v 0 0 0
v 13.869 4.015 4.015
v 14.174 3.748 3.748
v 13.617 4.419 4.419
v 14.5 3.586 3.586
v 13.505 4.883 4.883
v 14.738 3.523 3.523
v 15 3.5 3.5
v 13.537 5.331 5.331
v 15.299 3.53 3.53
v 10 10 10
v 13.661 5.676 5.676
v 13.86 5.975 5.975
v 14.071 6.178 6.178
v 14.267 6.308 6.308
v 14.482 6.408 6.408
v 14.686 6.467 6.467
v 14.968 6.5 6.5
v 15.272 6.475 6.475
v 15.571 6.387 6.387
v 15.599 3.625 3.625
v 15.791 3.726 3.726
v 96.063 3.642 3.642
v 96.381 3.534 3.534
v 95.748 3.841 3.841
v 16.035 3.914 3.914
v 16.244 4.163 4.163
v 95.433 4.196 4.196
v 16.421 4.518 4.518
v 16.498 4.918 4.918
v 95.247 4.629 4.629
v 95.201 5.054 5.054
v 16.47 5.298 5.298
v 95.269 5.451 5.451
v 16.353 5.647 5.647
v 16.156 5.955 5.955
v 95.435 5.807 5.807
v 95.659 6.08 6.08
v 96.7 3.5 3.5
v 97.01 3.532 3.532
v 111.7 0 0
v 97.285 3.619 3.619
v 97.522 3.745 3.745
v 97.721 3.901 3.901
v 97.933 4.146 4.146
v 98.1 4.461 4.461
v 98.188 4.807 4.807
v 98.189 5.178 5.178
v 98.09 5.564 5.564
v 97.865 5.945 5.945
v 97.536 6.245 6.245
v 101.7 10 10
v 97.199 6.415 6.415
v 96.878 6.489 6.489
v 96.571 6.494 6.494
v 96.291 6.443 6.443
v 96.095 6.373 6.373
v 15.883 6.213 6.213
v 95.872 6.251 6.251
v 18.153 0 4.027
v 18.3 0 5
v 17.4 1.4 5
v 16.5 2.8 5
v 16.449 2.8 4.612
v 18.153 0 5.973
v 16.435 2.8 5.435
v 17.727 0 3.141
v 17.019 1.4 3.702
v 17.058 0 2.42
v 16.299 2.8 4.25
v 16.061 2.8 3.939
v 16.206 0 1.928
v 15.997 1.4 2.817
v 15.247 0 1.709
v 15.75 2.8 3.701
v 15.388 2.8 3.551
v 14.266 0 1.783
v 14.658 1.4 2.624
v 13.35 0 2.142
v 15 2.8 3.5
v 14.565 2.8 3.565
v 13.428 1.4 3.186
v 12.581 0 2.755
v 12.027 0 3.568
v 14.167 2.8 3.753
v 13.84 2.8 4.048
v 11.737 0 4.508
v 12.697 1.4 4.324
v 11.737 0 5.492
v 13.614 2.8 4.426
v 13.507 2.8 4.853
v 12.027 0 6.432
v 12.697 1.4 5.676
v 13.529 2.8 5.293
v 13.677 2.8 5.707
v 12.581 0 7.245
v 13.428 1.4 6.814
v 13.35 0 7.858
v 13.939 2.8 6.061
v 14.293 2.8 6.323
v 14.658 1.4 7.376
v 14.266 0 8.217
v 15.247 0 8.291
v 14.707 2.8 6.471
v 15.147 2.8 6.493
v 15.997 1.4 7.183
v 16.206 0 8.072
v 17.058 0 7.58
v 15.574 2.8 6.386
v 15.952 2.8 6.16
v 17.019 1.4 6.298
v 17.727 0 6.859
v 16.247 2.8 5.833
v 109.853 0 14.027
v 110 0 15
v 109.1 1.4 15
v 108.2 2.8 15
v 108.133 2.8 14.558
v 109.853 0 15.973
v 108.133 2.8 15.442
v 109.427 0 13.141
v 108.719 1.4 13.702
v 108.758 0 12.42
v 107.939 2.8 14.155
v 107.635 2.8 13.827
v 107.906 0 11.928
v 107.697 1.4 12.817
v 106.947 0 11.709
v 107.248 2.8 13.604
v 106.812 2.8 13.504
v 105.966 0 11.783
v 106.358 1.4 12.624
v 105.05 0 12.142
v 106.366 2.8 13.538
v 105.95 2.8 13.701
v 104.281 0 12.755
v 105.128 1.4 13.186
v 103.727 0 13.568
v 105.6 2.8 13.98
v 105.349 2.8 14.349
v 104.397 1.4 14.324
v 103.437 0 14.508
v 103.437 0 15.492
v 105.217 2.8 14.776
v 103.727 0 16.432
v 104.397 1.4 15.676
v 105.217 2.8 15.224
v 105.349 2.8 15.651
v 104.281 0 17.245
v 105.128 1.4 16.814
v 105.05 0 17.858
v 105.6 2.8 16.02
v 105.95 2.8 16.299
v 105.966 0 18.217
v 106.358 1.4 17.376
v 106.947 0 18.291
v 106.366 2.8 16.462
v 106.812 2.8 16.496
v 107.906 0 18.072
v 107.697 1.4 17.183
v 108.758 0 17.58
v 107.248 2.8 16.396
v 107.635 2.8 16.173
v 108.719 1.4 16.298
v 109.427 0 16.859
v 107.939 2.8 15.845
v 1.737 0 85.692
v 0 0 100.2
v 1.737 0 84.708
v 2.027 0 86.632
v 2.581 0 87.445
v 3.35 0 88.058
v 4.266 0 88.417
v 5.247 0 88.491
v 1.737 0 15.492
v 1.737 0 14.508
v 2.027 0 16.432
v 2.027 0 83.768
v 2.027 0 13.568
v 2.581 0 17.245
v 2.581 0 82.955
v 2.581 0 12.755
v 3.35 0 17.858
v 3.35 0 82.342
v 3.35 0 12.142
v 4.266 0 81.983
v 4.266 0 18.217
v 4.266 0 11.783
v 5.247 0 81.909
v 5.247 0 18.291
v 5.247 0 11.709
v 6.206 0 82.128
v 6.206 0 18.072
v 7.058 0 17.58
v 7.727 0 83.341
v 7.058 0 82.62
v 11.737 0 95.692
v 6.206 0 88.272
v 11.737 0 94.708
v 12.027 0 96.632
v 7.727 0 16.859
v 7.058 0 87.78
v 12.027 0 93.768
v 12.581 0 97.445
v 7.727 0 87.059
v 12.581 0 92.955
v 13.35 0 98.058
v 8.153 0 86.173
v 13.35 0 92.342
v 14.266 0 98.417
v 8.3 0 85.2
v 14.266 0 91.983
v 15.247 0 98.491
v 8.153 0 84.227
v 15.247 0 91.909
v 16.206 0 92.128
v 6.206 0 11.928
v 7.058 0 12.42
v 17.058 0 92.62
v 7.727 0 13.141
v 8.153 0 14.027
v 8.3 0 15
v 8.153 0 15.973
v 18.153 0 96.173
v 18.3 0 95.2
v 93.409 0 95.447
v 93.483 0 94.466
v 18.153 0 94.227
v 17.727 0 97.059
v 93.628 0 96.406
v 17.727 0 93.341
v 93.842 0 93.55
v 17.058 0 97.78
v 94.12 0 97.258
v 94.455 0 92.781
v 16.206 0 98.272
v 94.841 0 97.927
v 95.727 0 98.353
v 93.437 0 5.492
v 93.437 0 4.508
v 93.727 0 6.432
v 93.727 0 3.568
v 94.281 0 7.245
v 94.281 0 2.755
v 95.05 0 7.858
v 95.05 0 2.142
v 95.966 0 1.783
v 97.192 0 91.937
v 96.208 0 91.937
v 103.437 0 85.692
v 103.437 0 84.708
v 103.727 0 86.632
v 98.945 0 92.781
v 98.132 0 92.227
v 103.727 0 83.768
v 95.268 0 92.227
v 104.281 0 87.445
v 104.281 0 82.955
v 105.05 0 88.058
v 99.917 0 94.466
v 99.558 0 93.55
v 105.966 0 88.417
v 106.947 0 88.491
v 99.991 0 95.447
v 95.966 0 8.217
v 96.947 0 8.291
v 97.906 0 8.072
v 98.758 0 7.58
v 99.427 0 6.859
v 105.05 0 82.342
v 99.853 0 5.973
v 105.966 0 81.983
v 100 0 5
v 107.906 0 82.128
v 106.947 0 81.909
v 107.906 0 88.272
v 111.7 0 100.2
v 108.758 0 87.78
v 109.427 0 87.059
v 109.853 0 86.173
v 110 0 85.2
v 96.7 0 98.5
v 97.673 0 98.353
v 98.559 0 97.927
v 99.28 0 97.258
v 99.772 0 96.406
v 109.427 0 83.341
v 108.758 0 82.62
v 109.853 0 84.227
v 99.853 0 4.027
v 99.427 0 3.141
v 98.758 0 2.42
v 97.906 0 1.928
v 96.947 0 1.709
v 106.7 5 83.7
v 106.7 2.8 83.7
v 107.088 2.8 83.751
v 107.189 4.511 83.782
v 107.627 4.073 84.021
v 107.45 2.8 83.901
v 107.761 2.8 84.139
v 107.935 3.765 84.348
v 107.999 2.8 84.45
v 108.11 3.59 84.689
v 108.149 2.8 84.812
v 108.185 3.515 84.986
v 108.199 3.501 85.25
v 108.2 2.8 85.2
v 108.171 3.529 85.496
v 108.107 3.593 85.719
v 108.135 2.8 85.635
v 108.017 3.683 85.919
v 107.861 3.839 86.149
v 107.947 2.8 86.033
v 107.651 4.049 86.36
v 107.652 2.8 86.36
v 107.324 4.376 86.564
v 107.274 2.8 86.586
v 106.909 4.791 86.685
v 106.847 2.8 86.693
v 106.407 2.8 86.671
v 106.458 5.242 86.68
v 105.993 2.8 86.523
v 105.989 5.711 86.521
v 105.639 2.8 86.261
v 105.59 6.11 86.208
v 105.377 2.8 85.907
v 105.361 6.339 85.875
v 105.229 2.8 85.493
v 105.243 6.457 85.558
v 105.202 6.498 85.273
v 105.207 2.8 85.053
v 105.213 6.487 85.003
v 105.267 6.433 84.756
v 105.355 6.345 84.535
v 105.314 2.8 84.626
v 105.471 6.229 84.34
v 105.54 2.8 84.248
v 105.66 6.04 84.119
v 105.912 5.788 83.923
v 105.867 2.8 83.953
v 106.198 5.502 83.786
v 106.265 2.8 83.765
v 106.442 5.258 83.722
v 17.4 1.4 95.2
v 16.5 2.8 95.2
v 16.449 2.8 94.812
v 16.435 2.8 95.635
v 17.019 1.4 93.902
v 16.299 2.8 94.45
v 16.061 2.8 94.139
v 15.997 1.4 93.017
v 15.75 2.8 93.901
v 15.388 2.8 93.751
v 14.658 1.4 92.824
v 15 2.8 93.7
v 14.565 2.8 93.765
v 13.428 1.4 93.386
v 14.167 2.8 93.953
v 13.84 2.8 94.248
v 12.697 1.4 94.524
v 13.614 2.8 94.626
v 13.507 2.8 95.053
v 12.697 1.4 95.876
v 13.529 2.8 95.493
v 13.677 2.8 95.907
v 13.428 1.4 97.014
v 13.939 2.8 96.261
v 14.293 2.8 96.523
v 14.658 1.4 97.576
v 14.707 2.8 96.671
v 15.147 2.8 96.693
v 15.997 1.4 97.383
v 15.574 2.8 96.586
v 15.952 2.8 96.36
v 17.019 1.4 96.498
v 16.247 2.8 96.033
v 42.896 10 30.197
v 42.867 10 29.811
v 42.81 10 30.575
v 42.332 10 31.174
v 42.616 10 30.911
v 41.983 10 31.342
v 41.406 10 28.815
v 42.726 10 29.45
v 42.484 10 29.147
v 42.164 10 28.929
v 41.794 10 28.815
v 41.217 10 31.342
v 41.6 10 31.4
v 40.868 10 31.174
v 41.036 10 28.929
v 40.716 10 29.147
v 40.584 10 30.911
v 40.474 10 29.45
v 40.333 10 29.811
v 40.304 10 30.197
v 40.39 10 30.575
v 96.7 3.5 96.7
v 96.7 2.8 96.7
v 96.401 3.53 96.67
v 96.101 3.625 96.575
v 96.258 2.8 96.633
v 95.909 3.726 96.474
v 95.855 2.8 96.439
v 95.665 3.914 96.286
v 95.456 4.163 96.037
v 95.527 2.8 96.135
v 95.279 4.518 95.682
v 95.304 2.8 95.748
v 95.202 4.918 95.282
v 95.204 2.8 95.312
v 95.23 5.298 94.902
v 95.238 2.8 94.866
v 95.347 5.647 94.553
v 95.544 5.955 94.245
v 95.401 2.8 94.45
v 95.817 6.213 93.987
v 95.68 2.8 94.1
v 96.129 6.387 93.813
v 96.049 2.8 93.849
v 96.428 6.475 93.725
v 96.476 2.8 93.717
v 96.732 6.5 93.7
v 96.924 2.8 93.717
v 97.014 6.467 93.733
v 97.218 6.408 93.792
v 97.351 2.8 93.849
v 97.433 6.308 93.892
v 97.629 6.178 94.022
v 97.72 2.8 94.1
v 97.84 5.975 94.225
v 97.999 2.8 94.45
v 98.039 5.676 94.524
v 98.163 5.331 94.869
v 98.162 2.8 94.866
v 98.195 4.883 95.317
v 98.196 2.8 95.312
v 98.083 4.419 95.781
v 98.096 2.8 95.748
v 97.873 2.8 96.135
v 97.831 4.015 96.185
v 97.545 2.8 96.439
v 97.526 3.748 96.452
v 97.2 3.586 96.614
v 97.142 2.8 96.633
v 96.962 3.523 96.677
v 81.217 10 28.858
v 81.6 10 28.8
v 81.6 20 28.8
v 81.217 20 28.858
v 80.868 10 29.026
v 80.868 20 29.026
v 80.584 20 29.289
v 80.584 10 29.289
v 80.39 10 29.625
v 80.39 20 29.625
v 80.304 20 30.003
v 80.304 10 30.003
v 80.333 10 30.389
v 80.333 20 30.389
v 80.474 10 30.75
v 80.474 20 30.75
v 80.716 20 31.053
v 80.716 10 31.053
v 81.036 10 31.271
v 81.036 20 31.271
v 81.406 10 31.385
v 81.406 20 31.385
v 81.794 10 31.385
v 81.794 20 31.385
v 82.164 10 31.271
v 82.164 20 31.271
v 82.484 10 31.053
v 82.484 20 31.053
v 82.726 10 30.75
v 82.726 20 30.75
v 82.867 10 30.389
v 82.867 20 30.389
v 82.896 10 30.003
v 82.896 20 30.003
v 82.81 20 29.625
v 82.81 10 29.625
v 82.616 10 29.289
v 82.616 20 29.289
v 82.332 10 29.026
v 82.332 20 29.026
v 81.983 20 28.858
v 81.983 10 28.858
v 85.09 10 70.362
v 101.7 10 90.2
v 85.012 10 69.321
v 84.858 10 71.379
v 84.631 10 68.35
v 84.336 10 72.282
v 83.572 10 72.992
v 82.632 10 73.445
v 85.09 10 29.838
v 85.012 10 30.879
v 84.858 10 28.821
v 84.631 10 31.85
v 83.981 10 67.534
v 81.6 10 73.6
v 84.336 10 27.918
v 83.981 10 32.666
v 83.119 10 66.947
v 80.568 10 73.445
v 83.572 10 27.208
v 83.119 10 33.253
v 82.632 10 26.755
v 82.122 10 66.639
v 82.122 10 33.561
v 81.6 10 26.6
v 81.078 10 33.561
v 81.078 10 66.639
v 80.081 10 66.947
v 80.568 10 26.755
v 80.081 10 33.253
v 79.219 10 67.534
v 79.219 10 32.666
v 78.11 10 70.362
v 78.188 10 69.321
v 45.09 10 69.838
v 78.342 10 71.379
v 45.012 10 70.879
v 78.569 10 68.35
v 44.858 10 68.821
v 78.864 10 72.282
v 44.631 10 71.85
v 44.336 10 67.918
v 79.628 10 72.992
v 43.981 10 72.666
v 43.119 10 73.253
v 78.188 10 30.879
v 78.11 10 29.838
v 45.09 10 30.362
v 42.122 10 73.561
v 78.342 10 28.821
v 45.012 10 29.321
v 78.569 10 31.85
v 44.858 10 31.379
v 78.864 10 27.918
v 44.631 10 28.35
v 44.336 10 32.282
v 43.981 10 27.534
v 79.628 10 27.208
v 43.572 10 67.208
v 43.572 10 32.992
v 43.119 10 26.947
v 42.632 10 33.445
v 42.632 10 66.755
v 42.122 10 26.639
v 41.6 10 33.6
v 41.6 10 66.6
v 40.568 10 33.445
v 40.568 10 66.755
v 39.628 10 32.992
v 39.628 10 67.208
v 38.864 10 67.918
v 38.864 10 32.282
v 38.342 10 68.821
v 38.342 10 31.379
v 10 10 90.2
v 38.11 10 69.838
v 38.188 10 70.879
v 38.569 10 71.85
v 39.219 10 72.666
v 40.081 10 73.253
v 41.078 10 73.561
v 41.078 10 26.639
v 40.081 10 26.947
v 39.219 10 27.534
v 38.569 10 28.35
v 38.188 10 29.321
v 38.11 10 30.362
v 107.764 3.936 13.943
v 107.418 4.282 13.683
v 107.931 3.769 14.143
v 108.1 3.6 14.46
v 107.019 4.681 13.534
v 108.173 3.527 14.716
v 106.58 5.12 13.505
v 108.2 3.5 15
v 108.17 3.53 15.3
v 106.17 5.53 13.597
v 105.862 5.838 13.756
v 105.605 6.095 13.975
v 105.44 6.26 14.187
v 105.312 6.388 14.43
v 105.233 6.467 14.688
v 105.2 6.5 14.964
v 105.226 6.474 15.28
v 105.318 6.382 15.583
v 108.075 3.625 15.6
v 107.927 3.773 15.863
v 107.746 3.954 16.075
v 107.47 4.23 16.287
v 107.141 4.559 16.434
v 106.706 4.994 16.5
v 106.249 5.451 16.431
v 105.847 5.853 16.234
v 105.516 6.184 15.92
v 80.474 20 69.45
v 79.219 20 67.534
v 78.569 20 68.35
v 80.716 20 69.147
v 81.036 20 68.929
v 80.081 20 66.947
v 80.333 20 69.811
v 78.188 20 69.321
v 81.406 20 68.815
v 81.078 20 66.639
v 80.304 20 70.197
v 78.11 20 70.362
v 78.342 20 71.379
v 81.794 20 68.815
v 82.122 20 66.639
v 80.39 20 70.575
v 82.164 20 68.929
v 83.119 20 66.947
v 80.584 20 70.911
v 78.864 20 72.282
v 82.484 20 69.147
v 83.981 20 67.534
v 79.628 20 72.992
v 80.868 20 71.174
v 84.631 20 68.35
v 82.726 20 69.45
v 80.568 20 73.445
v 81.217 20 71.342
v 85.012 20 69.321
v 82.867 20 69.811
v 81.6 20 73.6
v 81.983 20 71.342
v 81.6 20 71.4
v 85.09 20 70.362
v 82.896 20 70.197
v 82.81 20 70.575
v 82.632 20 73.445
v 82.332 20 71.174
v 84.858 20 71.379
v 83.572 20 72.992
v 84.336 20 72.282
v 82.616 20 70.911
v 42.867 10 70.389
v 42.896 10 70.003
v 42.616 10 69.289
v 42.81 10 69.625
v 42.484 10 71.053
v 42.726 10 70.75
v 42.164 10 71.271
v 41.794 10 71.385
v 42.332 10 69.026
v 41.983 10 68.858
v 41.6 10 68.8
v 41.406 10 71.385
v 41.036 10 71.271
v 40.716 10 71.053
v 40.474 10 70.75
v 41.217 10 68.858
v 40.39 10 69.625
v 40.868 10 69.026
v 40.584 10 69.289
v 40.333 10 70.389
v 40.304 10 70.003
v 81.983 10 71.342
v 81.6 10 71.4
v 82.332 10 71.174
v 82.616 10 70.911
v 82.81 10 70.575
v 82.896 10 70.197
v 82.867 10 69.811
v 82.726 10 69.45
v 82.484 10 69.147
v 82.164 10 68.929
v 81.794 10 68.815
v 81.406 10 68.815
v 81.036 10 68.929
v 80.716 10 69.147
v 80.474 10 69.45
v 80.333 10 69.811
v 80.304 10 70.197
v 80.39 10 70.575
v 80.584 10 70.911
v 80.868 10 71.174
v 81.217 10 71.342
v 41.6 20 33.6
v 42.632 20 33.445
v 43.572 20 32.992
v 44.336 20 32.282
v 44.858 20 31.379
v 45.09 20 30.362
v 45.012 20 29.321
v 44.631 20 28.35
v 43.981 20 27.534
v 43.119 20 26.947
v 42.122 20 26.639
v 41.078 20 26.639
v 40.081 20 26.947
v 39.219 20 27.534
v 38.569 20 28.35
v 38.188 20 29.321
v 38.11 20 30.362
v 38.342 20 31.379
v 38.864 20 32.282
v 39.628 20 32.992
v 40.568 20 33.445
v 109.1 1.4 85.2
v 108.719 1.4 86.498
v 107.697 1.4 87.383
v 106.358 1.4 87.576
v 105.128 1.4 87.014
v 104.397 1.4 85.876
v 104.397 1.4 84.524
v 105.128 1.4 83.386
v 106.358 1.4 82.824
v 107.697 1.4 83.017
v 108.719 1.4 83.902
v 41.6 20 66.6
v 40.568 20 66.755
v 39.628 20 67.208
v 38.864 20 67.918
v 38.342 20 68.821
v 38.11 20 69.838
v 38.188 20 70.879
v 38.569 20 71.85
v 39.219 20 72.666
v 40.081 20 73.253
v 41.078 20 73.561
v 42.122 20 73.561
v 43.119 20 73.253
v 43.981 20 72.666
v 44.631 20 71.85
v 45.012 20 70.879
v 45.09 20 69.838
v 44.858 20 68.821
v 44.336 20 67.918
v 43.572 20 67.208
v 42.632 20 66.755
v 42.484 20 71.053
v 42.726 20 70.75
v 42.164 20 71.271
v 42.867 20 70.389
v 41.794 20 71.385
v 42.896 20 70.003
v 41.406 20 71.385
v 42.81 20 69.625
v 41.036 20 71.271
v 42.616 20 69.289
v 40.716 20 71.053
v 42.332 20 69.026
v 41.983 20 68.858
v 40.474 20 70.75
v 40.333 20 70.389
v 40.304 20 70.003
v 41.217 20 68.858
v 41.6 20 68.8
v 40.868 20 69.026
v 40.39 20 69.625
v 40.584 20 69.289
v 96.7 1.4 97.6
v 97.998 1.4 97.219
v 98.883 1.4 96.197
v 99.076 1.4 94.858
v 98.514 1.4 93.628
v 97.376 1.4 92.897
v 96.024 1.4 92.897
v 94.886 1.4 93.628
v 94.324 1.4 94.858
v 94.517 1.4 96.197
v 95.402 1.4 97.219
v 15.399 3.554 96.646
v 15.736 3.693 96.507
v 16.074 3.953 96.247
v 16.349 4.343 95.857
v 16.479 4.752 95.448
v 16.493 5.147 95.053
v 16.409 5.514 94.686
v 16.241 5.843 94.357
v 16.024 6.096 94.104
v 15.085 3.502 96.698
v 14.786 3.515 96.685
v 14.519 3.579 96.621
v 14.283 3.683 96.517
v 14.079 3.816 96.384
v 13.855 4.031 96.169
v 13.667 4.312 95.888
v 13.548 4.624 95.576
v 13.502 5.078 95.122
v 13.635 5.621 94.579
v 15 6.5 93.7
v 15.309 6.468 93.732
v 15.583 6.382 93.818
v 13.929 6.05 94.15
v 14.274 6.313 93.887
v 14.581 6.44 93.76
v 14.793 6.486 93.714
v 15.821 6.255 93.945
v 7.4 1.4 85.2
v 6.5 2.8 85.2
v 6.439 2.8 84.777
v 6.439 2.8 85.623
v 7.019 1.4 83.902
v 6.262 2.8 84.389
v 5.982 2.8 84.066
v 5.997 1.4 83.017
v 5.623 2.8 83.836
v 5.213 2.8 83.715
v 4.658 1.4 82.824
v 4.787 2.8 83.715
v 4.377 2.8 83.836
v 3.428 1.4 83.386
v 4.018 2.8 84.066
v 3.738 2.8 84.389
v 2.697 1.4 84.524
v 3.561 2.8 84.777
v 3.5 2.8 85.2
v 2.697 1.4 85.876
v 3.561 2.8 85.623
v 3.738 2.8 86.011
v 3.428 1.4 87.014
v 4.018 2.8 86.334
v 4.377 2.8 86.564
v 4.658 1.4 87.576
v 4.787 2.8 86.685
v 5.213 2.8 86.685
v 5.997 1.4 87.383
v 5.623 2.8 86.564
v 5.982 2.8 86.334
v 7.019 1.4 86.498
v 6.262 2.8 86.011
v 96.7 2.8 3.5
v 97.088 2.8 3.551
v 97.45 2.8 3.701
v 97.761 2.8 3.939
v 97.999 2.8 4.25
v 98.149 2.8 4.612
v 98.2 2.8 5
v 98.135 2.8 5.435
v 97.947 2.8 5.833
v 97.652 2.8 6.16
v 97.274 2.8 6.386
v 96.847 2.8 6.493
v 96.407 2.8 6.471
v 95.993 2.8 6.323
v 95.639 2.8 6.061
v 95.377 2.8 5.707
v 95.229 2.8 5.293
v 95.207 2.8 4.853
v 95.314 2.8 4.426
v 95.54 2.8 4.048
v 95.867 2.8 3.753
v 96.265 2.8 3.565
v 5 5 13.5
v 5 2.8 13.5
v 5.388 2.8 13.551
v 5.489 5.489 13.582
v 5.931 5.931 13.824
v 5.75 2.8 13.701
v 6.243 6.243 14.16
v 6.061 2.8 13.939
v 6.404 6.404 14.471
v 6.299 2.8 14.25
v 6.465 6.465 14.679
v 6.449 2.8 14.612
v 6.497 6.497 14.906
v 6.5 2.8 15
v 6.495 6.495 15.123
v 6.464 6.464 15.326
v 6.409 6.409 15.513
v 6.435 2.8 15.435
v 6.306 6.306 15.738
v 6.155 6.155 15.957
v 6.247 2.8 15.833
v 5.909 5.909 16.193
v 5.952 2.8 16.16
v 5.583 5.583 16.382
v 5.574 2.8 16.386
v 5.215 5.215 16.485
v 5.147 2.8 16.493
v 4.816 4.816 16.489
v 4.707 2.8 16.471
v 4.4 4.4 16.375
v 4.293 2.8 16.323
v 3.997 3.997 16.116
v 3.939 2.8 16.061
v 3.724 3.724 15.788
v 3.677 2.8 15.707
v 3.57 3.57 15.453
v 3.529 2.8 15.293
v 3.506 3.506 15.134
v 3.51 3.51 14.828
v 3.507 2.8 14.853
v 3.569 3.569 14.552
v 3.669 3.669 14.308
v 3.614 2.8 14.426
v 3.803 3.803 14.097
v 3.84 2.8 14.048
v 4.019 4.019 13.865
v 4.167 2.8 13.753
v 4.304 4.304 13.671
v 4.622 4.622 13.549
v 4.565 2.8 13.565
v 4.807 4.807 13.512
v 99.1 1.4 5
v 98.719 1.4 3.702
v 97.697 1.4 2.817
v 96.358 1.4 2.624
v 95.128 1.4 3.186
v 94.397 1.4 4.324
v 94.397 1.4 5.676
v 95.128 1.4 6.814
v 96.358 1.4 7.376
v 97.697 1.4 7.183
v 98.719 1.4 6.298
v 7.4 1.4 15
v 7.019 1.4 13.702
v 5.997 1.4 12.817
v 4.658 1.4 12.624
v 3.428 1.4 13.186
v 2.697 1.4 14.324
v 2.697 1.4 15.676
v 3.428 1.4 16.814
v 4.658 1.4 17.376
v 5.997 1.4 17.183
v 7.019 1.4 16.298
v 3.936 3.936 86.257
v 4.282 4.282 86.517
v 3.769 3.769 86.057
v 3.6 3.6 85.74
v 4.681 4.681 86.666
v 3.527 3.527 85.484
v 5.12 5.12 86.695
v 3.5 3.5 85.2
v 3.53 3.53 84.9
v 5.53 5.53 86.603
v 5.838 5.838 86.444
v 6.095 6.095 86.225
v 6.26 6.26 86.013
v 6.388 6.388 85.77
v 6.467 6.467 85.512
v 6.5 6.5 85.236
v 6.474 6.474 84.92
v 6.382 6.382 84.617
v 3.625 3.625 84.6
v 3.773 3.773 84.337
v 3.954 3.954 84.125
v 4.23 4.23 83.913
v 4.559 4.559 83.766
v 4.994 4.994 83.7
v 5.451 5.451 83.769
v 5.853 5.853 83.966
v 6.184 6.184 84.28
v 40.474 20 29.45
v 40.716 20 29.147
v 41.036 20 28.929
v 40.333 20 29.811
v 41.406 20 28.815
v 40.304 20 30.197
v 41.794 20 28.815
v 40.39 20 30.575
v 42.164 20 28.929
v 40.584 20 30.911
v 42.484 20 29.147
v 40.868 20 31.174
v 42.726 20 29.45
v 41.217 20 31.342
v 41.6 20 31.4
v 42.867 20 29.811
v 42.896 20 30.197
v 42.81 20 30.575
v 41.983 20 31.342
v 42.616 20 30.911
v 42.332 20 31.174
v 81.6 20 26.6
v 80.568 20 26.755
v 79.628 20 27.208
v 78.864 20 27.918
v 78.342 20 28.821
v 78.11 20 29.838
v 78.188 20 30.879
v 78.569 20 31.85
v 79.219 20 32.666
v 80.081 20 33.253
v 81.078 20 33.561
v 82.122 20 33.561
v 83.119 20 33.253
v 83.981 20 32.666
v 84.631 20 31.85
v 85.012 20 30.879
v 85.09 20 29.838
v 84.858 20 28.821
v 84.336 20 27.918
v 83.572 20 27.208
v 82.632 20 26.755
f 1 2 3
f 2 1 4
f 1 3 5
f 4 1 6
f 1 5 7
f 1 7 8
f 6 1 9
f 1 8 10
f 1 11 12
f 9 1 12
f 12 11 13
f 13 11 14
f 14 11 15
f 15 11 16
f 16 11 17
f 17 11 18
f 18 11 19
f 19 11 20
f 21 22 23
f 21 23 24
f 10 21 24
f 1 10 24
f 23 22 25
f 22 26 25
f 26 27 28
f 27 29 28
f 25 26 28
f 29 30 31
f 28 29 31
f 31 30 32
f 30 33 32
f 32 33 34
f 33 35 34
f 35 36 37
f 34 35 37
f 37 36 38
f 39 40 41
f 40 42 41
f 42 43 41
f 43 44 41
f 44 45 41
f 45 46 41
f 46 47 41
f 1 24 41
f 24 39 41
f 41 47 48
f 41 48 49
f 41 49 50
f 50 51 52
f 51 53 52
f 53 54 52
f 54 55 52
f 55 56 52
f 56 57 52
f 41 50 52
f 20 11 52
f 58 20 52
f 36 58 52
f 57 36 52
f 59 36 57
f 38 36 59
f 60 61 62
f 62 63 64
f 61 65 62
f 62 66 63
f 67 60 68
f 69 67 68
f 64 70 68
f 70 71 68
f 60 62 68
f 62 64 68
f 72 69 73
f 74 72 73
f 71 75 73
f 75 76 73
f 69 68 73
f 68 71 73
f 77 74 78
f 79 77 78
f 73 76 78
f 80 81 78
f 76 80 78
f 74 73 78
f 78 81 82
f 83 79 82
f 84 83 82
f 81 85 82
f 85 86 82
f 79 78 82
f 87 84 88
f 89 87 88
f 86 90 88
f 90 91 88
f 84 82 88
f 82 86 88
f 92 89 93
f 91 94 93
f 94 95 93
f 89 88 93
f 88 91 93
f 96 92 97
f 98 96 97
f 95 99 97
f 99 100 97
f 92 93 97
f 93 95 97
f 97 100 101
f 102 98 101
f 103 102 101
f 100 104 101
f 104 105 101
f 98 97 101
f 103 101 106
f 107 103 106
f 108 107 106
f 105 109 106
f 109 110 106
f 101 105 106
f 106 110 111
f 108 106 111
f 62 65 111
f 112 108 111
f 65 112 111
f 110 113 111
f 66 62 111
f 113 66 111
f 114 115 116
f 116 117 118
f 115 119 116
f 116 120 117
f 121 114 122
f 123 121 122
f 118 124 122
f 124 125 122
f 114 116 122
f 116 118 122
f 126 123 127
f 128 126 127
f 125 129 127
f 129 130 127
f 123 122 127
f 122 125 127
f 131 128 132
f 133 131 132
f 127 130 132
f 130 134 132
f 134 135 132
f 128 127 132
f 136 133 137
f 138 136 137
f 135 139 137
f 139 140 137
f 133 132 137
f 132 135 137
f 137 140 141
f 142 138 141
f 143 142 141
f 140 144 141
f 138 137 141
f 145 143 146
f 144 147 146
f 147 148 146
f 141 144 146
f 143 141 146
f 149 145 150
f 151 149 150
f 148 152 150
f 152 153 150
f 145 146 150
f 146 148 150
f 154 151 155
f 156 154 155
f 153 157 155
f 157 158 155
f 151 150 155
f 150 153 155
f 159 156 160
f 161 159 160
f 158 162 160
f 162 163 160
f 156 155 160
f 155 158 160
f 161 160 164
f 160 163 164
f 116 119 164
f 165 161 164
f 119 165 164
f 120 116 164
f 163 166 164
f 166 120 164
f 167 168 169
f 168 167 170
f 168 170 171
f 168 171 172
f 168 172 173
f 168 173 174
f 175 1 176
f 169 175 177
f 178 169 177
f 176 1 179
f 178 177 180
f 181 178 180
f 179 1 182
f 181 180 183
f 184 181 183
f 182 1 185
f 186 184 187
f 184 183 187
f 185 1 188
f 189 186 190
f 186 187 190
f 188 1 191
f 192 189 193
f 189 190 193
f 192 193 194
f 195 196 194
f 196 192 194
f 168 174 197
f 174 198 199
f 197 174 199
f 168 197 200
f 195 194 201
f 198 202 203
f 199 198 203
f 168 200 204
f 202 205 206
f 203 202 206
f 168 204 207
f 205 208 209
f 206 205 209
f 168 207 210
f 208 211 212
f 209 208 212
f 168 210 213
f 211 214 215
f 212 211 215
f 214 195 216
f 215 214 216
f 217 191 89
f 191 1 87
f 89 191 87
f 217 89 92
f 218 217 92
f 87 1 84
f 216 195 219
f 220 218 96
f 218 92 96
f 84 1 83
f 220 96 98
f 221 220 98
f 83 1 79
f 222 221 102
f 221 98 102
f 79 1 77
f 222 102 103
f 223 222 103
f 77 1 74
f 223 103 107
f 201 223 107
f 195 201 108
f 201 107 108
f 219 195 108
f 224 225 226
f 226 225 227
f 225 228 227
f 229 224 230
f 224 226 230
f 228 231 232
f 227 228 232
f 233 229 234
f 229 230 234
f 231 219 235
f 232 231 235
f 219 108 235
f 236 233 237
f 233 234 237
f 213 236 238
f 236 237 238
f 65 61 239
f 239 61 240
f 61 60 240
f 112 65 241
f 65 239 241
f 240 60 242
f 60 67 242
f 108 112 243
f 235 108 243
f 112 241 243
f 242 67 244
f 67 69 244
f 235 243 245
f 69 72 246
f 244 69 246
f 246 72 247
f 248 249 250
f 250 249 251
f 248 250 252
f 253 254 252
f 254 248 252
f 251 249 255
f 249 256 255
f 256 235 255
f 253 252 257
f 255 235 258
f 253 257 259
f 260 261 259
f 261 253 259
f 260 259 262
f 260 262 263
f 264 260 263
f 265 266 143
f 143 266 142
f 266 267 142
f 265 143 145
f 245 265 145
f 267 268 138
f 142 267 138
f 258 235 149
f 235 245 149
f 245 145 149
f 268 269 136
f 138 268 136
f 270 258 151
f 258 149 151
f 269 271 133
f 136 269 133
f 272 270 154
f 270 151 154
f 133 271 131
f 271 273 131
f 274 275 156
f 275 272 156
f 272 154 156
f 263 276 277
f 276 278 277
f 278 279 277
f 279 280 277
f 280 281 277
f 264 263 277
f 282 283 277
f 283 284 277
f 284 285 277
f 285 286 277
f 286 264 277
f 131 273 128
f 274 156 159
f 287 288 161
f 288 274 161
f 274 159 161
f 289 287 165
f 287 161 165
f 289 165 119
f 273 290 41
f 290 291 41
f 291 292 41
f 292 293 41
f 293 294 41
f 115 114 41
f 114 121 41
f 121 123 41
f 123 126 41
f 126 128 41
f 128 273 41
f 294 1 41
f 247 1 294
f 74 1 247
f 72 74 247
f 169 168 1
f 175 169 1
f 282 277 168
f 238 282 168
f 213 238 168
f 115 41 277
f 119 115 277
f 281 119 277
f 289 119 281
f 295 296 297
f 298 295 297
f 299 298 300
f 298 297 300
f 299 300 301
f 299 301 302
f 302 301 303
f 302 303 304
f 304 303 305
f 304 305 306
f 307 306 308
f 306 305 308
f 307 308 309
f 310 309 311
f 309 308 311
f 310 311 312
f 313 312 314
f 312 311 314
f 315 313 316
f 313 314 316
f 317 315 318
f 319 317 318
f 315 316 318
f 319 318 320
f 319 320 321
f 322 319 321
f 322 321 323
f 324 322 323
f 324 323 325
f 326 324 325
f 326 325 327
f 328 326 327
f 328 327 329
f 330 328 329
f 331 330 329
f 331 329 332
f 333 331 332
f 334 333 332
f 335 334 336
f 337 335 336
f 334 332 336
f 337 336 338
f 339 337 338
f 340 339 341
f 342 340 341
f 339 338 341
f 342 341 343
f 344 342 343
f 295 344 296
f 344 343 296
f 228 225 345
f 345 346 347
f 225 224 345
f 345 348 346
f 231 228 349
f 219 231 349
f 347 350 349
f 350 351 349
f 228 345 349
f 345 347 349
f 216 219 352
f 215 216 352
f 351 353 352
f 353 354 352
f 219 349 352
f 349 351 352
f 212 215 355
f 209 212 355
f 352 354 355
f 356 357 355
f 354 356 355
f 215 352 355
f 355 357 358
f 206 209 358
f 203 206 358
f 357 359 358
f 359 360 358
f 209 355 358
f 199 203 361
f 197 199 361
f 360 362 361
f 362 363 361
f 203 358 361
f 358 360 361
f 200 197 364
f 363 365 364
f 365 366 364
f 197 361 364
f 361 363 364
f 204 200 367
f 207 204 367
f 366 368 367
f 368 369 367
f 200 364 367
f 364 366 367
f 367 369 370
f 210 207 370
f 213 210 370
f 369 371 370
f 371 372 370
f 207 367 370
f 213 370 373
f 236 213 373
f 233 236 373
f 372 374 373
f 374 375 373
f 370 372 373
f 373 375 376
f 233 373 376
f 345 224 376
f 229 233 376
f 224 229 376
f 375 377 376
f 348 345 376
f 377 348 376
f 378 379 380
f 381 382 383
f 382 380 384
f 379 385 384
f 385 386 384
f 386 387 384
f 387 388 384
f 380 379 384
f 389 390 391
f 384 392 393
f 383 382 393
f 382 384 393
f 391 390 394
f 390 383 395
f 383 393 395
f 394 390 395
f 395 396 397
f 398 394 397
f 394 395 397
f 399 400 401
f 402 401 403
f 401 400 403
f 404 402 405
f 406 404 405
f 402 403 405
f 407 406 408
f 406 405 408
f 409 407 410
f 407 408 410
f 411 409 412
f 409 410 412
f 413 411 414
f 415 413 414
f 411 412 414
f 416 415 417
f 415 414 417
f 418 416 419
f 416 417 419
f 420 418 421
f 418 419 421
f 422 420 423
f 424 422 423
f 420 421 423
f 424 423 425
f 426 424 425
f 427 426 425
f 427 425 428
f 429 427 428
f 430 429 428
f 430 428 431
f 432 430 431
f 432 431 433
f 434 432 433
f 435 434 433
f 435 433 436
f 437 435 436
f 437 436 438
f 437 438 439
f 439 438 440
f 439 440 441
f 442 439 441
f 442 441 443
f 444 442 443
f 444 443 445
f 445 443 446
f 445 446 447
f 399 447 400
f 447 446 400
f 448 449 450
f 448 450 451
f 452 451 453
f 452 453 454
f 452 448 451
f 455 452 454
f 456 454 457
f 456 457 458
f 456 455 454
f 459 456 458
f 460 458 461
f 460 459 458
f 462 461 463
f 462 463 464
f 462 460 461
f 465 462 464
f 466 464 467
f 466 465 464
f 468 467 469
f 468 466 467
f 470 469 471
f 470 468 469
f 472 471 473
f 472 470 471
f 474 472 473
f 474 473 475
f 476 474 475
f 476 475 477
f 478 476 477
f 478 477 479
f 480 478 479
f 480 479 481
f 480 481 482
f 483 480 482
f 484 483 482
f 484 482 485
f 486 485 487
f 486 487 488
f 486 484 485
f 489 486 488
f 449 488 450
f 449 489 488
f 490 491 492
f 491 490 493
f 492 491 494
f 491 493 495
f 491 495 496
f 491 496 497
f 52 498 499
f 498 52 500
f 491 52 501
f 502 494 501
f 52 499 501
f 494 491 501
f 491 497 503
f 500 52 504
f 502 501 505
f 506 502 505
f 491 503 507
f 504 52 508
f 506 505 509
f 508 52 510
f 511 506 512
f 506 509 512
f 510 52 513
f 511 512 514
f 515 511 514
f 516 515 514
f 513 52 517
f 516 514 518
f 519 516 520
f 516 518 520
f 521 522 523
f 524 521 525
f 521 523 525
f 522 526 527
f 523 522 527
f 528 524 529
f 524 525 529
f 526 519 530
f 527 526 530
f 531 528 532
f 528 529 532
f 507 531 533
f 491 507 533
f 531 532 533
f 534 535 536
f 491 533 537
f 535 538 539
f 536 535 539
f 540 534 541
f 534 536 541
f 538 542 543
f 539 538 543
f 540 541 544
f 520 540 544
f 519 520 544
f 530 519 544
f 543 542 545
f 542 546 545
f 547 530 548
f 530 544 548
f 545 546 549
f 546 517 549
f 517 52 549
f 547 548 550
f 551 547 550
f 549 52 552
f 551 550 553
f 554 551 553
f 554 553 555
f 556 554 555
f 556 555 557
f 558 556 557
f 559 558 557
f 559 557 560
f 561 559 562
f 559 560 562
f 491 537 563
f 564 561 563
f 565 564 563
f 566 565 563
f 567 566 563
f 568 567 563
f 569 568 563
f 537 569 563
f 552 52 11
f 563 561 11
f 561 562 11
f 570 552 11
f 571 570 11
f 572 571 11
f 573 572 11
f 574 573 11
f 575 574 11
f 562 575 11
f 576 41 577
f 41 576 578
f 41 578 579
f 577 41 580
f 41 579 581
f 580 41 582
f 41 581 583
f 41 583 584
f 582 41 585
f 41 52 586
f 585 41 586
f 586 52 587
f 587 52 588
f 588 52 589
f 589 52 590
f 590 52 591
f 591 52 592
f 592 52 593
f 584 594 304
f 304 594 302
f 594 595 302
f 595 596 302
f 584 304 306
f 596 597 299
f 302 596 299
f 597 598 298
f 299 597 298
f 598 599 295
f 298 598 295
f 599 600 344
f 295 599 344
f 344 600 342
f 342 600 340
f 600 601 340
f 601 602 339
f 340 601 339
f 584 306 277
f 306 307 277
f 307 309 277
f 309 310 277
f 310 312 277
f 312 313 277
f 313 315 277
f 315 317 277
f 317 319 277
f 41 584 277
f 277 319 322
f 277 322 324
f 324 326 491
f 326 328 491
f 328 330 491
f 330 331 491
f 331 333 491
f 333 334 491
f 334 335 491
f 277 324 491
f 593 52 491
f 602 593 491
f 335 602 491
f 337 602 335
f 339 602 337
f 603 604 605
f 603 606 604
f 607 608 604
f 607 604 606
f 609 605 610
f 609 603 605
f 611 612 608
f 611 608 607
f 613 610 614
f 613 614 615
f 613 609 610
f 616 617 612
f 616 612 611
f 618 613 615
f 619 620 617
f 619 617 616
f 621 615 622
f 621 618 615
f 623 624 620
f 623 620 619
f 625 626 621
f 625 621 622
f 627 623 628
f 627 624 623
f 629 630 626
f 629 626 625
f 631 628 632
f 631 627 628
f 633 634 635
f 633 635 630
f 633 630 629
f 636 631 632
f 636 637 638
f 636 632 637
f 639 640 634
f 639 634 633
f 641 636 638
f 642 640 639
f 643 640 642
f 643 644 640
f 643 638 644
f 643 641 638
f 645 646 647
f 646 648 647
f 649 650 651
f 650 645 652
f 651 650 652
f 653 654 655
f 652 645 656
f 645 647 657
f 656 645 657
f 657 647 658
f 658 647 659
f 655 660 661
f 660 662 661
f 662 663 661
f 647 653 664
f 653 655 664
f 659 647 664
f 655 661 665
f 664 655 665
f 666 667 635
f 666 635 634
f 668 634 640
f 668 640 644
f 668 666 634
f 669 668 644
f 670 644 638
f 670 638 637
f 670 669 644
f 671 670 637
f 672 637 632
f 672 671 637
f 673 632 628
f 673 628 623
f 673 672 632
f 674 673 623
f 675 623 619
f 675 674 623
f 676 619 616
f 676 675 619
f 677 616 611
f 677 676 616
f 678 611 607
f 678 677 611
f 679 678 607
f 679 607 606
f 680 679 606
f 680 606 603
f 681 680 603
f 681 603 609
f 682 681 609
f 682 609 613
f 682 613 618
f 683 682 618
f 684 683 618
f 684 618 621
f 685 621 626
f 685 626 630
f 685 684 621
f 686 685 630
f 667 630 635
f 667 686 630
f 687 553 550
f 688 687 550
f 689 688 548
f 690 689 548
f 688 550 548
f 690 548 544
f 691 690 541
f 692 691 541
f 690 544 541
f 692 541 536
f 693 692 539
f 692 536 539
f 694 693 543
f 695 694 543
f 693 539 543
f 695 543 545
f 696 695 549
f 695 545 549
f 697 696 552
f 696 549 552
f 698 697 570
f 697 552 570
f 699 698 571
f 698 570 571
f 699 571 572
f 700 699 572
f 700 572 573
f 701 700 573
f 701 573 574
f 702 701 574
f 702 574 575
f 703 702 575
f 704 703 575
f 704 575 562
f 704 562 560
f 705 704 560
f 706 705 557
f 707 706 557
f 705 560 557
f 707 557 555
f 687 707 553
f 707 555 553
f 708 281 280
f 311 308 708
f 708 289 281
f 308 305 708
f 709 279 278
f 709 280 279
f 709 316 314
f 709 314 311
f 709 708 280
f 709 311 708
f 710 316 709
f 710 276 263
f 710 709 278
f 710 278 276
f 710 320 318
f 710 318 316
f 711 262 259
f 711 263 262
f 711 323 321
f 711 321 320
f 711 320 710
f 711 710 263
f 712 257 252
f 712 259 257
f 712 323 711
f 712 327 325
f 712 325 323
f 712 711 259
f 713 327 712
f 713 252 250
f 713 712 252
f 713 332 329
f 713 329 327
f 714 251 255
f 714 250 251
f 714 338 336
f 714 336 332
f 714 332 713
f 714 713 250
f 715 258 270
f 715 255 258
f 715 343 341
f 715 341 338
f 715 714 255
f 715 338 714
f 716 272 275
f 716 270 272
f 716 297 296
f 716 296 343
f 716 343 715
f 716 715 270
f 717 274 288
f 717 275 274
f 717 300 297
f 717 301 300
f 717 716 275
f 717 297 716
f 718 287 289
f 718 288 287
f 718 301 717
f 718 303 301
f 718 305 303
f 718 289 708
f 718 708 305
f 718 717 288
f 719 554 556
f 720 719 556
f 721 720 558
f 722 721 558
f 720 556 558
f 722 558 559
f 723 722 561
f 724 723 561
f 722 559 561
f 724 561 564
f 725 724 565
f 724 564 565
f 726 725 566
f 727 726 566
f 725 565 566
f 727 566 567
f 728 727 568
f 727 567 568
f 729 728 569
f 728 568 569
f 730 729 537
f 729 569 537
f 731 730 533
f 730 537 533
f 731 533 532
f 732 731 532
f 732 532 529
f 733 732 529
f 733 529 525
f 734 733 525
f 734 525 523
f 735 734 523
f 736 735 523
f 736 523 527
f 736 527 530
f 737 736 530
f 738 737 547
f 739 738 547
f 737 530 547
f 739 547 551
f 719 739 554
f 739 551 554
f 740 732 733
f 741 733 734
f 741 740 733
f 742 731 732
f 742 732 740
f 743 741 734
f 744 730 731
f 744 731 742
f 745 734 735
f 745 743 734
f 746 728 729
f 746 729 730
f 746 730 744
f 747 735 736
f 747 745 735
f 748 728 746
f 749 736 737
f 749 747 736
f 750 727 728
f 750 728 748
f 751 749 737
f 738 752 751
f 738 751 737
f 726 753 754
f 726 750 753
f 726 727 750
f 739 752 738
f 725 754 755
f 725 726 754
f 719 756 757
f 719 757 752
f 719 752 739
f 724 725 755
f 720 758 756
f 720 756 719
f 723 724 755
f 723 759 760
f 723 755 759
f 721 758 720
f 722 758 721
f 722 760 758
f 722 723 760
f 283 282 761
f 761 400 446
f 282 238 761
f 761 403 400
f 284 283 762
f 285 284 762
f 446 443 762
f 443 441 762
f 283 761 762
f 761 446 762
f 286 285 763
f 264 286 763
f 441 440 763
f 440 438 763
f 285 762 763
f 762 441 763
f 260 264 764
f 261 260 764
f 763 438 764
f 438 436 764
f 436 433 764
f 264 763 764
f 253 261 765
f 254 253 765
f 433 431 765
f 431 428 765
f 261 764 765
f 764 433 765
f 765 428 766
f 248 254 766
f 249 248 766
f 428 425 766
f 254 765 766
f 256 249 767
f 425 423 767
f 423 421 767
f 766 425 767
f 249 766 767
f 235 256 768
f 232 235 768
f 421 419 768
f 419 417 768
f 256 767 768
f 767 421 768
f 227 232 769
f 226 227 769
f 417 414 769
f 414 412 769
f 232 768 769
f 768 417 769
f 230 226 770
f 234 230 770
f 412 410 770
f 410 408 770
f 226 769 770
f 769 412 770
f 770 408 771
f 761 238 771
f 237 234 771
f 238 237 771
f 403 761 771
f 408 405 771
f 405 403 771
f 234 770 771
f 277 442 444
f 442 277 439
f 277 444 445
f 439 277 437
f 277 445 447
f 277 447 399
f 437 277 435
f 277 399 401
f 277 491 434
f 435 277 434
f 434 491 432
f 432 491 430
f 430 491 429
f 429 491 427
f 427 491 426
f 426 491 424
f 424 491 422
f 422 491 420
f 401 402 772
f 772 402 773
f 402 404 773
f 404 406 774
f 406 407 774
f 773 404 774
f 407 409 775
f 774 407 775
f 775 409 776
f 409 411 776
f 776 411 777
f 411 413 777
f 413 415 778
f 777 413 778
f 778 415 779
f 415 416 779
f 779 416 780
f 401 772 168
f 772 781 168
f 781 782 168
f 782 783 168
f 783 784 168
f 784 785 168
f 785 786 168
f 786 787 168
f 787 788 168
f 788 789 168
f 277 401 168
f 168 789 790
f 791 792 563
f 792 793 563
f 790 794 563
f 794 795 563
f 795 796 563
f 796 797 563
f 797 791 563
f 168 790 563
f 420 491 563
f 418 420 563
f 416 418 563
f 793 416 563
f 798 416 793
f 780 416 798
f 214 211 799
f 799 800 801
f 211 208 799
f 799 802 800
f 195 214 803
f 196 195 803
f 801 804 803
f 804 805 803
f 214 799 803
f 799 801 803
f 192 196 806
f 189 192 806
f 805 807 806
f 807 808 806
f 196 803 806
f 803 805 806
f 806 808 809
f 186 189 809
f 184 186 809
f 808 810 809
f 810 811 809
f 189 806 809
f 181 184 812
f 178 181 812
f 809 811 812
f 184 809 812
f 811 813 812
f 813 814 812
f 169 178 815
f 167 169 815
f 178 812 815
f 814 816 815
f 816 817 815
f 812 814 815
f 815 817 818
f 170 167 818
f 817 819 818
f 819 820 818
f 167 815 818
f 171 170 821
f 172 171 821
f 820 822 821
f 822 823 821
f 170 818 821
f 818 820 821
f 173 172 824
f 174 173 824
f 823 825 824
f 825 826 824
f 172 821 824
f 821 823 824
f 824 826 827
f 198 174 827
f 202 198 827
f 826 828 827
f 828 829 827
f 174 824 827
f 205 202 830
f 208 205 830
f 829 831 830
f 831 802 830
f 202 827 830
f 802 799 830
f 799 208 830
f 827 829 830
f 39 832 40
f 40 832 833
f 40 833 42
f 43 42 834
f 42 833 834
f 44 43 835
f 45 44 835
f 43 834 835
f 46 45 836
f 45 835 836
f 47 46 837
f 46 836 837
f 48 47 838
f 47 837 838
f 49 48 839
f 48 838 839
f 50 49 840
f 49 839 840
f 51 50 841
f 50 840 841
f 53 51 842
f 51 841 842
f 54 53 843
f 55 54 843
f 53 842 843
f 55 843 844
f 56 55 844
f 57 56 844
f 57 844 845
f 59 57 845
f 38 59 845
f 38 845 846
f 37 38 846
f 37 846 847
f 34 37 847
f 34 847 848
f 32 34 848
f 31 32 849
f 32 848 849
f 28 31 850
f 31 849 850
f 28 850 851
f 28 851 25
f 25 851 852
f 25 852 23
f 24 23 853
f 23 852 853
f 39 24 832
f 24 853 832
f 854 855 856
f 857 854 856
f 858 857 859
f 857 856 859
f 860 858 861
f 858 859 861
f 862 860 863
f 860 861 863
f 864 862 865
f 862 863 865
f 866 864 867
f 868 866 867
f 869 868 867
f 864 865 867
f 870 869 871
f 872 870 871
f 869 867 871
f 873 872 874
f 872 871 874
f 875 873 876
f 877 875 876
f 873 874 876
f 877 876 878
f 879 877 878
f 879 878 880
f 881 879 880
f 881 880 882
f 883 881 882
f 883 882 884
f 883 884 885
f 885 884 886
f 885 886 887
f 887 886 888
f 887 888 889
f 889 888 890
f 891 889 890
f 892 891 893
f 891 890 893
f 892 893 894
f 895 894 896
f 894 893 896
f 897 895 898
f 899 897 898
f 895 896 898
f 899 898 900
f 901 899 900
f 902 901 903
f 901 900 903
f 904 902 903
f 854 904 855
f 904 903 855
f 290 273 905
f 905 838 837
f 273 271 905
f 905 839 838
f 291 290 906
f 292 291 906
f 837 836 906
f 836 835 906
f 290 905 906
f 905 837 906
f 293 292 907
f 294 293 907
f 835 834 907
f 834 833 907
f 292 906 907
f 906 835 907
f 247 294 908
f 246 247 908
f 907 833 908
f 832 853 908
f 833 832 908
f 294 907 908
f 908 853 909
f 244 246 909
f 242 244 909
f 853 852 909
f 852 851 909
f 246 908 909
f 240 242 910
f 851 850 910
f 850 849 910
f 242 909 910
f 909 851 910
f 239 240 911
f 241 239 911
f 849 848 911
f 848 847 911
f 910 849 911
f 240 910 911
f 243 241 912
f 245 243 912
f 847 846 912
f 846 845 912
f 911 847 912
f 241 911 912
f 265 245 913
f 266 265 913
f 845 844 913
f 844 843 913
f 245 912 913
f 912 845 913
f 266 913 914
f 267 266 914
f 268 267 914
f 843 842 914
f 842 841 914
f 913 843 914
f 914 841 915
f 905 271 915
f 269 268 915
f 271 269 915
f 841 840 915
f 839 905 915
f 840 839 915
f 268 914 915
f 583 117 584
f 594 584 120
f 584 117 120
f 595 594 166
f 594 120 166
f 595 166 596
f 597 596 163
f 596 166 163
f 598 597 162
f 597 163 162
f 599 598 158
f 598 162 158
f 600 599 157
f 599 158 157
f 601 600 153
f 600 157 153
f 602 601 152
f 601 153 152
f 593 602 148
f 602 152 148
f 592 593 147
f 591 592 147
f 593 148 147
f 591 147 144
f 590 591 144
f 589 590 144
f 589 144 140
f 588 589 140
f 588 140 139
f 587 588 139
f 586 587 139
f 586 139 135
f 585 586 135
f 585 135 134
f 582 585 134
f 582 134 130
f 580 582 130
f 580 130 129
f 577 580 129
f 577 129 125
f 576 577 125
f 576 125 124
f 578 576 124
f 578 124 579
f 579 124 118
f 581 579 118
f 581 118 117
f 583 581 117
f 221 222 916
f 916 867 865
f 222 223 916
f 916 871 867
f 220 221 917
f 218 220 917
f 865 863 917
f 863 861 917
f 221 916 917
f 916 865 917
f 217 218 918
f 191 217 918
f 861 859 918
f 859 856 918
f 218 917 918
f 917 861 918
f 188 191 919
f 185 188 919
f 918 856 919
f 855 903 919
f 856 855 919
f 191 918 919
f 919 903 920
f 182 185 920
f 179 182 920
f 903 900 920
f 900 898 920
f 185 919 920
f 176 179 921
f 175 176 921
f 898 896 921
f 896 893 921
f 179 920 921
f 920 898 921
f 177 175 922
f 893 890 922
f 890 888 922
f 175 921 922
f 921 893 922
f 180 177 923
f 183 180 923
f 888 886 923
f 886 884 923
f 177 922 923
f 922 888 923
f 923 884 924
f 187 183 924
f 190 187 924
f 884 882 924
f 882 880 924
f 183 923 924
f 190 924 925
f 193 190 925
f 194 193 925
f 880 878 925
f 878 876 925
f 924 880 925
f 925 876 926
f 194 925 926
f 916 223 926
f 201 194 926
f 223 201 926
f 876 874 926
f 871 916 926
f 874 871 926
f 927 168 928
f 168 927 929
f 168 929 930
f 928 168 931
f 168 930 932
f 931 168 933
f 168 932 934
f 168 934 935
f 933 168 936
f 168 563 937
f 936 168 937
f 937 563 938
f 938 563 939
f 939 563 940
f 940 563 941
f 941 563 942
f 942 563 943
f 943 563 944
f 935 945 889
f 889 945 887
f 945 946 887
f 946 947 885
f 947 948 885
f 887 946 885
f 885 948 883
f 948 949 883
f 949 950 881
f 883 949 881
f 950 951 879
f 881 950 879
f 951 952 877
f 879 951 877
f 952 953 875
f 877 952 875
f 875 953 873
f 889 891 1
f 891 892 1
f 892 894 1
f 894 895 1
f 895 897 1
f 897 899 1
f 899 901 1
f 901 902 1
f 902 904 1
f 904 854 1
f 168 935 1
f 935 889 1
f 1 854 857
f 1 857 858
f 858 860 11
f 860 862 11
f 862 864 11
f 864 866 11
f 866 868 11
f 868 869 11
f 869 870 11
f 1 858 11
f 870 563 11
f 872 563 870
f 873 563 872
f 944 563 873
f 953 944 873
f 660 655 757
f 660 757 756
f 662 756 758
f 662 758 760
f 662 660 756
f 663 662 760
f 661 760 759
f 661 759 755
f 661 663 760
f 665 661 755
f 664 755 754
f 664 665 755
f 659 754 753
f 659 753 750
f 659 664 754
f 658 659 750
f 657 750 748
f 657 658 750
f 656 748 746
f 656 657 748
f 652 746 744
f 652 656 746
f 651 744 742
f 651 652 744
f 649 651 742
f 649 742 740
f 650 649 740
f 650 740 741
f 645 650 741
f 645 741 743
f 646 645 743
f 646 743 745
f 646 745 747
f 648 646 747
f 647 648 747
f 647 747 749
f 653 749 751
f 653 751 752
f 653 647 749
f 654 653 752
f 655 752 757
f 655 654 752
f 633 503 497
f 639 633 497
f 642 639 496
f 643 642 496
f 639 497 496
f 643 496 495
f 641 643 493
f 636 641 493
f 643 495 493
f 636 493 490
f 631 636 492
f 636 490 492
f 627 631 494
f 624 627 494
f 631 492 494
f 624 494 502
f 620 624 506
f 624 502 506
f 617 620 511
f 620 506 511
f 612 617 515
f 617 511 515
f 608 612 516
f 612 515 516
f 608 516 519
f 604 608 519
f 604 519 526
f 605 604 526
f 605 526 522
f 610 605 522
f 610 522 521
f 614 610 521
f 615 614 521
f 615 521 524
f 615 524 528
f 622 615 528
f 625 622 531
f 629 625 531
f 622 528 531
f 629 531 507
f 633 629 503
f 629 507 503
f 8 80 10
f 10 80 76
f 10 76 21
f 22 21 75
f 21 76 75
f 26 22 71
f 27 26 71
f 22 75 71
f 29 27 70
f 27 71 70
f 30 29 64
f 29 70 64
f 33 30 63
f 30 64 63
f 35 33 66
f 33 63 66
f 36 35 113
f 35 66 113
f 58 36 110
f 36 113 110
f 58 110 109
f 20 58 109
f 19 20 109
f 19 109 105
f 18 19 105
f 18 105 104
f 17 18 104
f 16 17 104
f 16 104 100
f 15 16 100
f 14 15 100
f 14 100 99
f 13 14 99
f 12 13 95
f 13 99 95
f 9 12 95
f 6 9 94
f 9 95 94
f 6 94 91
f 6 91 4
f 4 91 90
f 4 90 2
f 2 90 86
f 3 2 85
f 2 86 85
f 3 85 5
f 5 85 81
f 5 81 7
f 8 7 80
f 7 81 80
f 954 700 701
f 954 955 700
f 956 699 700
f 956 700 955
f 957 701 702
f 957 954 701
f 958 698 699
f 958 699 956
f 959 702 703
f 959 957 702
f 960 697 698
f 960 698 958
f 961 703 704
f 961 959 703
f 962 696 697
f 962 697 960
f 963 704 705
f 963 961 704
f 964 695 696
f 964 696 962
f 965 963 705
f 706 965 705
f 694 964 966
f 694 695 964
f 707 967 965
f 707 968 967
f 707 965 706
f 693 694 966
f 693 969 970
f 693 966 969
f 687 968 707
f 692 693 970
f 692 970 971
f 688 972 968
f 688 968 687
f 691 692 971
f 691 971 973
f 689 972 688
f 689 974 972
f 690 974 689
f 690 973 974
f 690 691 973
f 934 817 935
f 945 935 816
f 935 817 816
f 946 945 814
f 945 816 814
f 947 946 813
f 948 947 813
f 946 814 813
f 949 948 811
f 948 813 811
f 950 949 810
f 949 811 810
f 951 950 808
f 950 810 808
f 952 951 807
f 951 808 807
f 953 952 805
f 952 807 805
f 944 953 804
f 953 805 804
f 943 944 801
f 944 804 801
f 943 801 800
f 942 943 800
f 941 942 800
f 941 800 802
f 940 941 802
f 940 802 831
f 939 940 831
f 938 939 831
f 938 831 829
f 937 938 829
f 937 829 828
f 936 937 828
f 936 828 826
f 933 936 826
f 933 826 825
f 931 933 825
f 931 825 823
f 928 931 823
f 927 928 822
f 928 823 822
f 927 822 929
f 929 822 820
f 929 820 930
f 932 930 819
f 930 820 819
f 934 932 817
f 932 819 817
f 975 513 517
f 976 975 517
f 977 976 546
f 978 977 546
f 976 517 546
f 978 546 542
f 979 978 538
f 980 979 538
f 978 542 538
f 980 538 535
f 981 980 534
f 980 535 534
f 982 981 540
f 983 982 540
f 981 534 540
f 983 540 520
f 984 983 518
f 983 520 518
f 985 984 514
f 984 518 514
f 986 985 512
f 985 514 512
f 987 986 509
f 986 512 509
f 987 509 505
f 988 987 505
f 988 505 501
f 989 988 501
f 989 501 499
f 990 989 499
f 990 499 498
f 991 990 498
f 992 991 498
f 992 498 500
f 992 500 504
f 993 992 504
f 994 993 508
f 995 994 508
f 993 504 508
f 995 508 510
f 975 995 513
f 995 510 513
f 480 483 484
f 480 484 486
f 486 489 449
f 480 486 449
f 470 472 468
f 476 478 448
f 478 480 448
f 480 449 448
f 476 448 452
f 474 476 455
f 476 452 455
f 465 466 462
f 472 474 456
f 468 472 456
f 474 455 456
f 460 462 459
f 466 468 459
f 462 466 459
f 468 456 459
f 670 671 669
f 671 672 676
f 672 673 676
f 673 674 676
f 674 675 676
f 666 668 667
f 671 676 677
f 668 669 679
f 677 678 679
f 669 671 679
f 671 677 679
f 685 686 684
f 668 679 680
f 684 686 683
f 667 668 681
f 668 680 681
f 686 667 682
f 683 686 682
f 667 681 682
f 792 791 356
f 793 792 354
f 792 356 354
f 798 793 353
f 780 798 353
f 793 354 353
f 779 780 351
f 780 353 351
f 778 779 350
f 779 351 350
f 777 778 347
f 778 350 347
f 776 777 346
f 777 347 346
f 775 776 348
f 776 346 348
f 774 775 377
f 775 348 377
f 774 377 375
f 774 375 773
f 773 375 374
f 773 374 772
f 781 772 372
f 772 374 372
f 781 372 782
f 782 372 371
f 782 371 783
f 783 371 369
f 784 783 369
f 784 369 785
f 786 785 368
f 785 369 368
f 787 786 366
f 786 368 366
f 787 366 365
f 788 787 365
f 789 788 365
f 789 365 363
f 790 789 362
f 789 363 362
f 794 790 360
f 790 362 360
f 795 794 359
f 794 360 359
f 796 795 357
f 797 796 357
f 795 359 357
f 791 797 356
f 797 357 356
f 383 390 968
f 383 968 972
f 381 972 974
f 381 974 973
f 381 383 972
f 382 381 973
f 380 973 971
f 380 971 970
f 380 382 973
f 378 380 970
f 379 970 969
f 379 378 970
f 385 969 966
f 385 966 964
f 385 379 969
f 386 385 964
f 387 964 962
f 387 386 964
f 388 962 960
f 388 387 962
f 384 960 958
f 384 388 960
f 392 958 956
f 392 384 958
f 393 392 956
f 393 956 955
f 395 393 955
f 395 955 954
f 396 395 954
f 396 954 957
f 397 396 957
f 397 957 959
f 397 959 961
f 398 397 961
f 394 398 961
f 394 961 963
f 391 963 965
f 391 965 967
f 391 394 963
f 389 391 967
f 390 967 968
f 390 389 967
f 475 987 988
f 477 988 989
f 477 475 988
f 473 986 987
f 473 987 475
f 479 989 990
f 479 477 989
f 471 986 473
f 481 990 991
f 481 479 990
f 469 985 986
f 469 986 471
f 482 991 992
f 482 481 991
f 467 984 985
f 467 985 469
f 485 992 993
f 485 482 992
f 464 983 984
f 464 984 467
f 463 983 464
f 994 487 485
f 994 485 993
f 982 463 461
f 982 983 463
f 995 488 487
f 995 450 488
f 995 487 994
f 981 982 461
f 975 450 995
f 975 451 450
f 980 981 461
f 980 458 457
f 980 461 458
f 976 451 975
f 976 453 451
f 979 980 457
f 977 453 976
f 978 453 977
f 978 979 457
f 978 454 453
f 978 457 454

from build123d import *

# Parameters (mm, degrees)
SKETCH3_R           = 1.5
CUT_EXTRUDE1_DEPTH  = 151.389261732
SKETCH4_R           = 3.5
SKETCH4_R_2         = 1.3
BOSS_EXTRUDE1_DEPTH = 10
SKETCH5_R           = 3.3
SKETCH6_R           = 1.5


# Read off the part's stored shape, not the designer's step: Mirror2, Mirror3
with BuildPart() as part:
    # Sketch1 → Loft1 section 0
    with BuildSketch(Plane(origin=(0, 0, 0), x_dir=(1, 0, 0), z_dir=(0, 1, 0))):
        with BuildLine():
            Line((0, 0), (111.7, 0))
            Line((111.7, 0), (111.7, -100.2))
            Line((111.7, -100.2), (0, -100.2))
            Line((0, -100.2), (0, 0))
        make_face()
    # Sketch2 → Loft1 section 1
    with BuildSketch(Plane(origin=(0, 10, 0), x_dir=(1, 0, 0), z_dir=(0, 1, 0))):
        with BuildLine():
            Line((10, -10), (10, -90.2))
            Line((10, -90.2), (101.7, -90.2))
            Line((101.7, -90.2), (101.7, -10))
            Line((101.7, -10), (10, -10))
        make_face()
    loft()

    # Sketch3 → Cut-Extrude1 (cut, through all)
    with BuildSketch(Plane.XZ):
        with Locations(Location((5, 15, 0), (0, 0, 270))):
            Circle(SKETCH3_R)
        with Locations(Location((5, 85.2, 0), (0, 0, 180))):
            Circle(SKETCH3_R)
        with Locations(Location((106.7, 85.2, 0), (0, 0, 270))):
            Circle(SKETCH3_R)
        with Locations((106.7, 15)):
            Circle(SKETCH3_R)
        with Locations(Location((15, 5, 0), (0, 0, 270))):
            Circle(SKETCH3_R)
        with Locations(Location((15, 95.2, 0), (0, 0, 270))):
            Circle(SKETCH3_R)
        with Locations(Location((96.7, 95.2, 0), (0, 0, 90))):
            Circle(SKETCH3_R)
        with Locations(Location((96.7, 5, 0), (0, 0, 270))):
            Circle(SKETCH3_R)
    extrude(amount=-CUT_EXTRUDE1_DEPTH, mode=Mode.SUBTRACT)

    # Sketch4 → Boss-Extrude1 (add)
    # profile 1 of 4: a face of its own
    with BuildSketch(Plane(origin=(0, 10, 0), x_dir=(1, 0, 0), z_dir=(0, 1, 0))):
        with Locations(Location((81.6, -70.1, 0), (0, 0, 270))):
            Circle(SKETCH4_R)
        with Locations(Location((81.6, -70.1, 0), (0, 0, 270))):
            Circle(SKETCH4_R_2, mode=Mode.SUBTRACT)
    # profile 2 of 4: a face of its own
    with BuildSketch(Plane(origin=(0, 10, 0), x_dir=(1, 0, 0), z_dir=(0, 1, 0))):
        with Locations(Location((81.6, -30.1, 0), (0, 0, 90))):
            Circle(SKETCH4_R)
        with Locations(Location((81.6, -30.1, 0), (0, 0, 90))):
            Circle(SKETCH4_R_2, mode=Mode.SUBTRACT)
    # profile 3 of 4: a face of its own
    with BuildSketch(Plane(origin=(0, 10, 0), x_dir=(1, 0, 0), z_dir=(0, 1, 0))):
        with Locations(Location((41.6, -70.1, 0), (0, 0, 90))):
            Circle(SKETCH4_R)
        with Locations(Location((41.6, -70.1, 0), (0, 0, 90))):
            Circle(SKETCH4_R_2, mode=Mode.SUBTRACT)
    # profile 4 of 4: a face of its own
    with BuildSketch(Plane(origin=(0, 10, 0), x_dir=(1, 0, 0), z_dir=(0, 1, 0))):
        with Locations(Location((41.6, -30.1, 0), (0, 0, 270))):
            Circle(SKETCH4_R)
        with Locations(Location((41.6, -30.1, 0), (0, 0, 270))):
            Circle(SKETCH4_R_2, mode=Mode.SUBTRACT)
    extrude(amount=BOSS_EXTRUDE1_DEPTH)

    # Sketch5 → Cut-Loft1 section 0
    with BuildSketch(Plane.XZ):
        with Locations((106.7, 85.2)):
            Circle(SKETCH5_R)
    # Sketch6 → Cut-Loft1 section 1
    with BuildSketch(Plane(origin=(0, 2.8, 0), x_dir=(-1, 0, 0), z_dir=(0, -1, 0))):
        with Locations((-106.7, -85.2)):
            Circle(SKETCH6_R)
    cut_loft1 = loft(mode=Mode.SUBTRACT)

    # Mirror1: Cut-Loft1 across plane
    add(cut_loft1.mirror(Plane(origin=(5.75, 0, -5.75), x_dir=(0.7071067811865476, 0, 0.7071067811865476), z_dir=(0.7071067811865477, 0, -0.7071067811865475))), mode=Mode.SUBTRACT)

    # Mirror2 outline → Mirror2 (revolve, cut)
    with BuildSketch(Plane(origin=(106.7, 0, 15), x_dir=(1, 0, 0), z_dir=(0, 0, 1))):
        Polygon((3.3, 0), (1.5, 2.8), (1.5, 0), align=None)
    revolve(axis=Axis((106.7, 0, 15), (0, 1, 0)), mode=Mode.SUBTRACT)

    # Mirror2 2 outline → Mirror2 2 (revolve, cut)
    with BuildSketch(Plane(origin=(96.7, 0, 5), x_dir=(1, 0, 0), z_dir=(0, 0, 1))):
        Polygon((3.3, 0), (1.5, 2.8), (1.5, 0), align=None)
    revolve(axis=Axis((96.7, 0, 5), (0, 1, 0)), mode=Mode.SUBTRACT)

    # Mirror3 outline → Mirror3 (revolve, cut)
    with BuildSketch(Plane(origin=(5, 0, 85.2), x_dir=(1, 0, 0), z_dir=(0, 0, 1))):
        Polygon((3.3, 0), (1.5, 2.8), (1.5, 0), align=None)
    revolve(axis=Axis((5, 0, 85.2), (0, 1, 0)), mode=Mode.SUBTRACT)

    # Mirror3 2 outline → Mirror3 2 (revolve, cut)
    with BuildSketch(Plane(origin=(15, 0, 95.2), x_dir=(1, 0, 0), z_dir=(0, 0, 1))):
        Polygon((3.3, 0), (1.5, 2.8), (1.5, 0), align=None)
    revolve(axis=Axis((15, 0, 95.2), (0, 1, 0)), mode=Mode.SUBTRACT)

    # Mirror3 3 outline → Mirror3 3 (revolve, cut)
    with BuildSketch(Plane(origin=(5, 0, 15), x_dir=(1, 0, 0), z_dir=(0, 0, 1))):
        Polygon((3.3, 0), (1.5, 2.8), (1.5, 0), align=None)
    revolve(axis=Axis((5, 0, 15), (0, 1, 0)), mode=Mode.SUBTRACT)

    # Mirror3 4 outline → Mirror3 4 (revolve, cut)
    with BuildSketch(Plane(origin=(15, 0, 5), x_dir=(1, 0, 0), z_dir=(0, 0, 1))):
        Polygon((3.3, 0), (1.5, 2.8), (1.5, 0), align=None)
    revolve(axis=Axis((15, 0, 5), (0, 1, 0)), mode=Mode.SUBTRACT)


solid = part.part
